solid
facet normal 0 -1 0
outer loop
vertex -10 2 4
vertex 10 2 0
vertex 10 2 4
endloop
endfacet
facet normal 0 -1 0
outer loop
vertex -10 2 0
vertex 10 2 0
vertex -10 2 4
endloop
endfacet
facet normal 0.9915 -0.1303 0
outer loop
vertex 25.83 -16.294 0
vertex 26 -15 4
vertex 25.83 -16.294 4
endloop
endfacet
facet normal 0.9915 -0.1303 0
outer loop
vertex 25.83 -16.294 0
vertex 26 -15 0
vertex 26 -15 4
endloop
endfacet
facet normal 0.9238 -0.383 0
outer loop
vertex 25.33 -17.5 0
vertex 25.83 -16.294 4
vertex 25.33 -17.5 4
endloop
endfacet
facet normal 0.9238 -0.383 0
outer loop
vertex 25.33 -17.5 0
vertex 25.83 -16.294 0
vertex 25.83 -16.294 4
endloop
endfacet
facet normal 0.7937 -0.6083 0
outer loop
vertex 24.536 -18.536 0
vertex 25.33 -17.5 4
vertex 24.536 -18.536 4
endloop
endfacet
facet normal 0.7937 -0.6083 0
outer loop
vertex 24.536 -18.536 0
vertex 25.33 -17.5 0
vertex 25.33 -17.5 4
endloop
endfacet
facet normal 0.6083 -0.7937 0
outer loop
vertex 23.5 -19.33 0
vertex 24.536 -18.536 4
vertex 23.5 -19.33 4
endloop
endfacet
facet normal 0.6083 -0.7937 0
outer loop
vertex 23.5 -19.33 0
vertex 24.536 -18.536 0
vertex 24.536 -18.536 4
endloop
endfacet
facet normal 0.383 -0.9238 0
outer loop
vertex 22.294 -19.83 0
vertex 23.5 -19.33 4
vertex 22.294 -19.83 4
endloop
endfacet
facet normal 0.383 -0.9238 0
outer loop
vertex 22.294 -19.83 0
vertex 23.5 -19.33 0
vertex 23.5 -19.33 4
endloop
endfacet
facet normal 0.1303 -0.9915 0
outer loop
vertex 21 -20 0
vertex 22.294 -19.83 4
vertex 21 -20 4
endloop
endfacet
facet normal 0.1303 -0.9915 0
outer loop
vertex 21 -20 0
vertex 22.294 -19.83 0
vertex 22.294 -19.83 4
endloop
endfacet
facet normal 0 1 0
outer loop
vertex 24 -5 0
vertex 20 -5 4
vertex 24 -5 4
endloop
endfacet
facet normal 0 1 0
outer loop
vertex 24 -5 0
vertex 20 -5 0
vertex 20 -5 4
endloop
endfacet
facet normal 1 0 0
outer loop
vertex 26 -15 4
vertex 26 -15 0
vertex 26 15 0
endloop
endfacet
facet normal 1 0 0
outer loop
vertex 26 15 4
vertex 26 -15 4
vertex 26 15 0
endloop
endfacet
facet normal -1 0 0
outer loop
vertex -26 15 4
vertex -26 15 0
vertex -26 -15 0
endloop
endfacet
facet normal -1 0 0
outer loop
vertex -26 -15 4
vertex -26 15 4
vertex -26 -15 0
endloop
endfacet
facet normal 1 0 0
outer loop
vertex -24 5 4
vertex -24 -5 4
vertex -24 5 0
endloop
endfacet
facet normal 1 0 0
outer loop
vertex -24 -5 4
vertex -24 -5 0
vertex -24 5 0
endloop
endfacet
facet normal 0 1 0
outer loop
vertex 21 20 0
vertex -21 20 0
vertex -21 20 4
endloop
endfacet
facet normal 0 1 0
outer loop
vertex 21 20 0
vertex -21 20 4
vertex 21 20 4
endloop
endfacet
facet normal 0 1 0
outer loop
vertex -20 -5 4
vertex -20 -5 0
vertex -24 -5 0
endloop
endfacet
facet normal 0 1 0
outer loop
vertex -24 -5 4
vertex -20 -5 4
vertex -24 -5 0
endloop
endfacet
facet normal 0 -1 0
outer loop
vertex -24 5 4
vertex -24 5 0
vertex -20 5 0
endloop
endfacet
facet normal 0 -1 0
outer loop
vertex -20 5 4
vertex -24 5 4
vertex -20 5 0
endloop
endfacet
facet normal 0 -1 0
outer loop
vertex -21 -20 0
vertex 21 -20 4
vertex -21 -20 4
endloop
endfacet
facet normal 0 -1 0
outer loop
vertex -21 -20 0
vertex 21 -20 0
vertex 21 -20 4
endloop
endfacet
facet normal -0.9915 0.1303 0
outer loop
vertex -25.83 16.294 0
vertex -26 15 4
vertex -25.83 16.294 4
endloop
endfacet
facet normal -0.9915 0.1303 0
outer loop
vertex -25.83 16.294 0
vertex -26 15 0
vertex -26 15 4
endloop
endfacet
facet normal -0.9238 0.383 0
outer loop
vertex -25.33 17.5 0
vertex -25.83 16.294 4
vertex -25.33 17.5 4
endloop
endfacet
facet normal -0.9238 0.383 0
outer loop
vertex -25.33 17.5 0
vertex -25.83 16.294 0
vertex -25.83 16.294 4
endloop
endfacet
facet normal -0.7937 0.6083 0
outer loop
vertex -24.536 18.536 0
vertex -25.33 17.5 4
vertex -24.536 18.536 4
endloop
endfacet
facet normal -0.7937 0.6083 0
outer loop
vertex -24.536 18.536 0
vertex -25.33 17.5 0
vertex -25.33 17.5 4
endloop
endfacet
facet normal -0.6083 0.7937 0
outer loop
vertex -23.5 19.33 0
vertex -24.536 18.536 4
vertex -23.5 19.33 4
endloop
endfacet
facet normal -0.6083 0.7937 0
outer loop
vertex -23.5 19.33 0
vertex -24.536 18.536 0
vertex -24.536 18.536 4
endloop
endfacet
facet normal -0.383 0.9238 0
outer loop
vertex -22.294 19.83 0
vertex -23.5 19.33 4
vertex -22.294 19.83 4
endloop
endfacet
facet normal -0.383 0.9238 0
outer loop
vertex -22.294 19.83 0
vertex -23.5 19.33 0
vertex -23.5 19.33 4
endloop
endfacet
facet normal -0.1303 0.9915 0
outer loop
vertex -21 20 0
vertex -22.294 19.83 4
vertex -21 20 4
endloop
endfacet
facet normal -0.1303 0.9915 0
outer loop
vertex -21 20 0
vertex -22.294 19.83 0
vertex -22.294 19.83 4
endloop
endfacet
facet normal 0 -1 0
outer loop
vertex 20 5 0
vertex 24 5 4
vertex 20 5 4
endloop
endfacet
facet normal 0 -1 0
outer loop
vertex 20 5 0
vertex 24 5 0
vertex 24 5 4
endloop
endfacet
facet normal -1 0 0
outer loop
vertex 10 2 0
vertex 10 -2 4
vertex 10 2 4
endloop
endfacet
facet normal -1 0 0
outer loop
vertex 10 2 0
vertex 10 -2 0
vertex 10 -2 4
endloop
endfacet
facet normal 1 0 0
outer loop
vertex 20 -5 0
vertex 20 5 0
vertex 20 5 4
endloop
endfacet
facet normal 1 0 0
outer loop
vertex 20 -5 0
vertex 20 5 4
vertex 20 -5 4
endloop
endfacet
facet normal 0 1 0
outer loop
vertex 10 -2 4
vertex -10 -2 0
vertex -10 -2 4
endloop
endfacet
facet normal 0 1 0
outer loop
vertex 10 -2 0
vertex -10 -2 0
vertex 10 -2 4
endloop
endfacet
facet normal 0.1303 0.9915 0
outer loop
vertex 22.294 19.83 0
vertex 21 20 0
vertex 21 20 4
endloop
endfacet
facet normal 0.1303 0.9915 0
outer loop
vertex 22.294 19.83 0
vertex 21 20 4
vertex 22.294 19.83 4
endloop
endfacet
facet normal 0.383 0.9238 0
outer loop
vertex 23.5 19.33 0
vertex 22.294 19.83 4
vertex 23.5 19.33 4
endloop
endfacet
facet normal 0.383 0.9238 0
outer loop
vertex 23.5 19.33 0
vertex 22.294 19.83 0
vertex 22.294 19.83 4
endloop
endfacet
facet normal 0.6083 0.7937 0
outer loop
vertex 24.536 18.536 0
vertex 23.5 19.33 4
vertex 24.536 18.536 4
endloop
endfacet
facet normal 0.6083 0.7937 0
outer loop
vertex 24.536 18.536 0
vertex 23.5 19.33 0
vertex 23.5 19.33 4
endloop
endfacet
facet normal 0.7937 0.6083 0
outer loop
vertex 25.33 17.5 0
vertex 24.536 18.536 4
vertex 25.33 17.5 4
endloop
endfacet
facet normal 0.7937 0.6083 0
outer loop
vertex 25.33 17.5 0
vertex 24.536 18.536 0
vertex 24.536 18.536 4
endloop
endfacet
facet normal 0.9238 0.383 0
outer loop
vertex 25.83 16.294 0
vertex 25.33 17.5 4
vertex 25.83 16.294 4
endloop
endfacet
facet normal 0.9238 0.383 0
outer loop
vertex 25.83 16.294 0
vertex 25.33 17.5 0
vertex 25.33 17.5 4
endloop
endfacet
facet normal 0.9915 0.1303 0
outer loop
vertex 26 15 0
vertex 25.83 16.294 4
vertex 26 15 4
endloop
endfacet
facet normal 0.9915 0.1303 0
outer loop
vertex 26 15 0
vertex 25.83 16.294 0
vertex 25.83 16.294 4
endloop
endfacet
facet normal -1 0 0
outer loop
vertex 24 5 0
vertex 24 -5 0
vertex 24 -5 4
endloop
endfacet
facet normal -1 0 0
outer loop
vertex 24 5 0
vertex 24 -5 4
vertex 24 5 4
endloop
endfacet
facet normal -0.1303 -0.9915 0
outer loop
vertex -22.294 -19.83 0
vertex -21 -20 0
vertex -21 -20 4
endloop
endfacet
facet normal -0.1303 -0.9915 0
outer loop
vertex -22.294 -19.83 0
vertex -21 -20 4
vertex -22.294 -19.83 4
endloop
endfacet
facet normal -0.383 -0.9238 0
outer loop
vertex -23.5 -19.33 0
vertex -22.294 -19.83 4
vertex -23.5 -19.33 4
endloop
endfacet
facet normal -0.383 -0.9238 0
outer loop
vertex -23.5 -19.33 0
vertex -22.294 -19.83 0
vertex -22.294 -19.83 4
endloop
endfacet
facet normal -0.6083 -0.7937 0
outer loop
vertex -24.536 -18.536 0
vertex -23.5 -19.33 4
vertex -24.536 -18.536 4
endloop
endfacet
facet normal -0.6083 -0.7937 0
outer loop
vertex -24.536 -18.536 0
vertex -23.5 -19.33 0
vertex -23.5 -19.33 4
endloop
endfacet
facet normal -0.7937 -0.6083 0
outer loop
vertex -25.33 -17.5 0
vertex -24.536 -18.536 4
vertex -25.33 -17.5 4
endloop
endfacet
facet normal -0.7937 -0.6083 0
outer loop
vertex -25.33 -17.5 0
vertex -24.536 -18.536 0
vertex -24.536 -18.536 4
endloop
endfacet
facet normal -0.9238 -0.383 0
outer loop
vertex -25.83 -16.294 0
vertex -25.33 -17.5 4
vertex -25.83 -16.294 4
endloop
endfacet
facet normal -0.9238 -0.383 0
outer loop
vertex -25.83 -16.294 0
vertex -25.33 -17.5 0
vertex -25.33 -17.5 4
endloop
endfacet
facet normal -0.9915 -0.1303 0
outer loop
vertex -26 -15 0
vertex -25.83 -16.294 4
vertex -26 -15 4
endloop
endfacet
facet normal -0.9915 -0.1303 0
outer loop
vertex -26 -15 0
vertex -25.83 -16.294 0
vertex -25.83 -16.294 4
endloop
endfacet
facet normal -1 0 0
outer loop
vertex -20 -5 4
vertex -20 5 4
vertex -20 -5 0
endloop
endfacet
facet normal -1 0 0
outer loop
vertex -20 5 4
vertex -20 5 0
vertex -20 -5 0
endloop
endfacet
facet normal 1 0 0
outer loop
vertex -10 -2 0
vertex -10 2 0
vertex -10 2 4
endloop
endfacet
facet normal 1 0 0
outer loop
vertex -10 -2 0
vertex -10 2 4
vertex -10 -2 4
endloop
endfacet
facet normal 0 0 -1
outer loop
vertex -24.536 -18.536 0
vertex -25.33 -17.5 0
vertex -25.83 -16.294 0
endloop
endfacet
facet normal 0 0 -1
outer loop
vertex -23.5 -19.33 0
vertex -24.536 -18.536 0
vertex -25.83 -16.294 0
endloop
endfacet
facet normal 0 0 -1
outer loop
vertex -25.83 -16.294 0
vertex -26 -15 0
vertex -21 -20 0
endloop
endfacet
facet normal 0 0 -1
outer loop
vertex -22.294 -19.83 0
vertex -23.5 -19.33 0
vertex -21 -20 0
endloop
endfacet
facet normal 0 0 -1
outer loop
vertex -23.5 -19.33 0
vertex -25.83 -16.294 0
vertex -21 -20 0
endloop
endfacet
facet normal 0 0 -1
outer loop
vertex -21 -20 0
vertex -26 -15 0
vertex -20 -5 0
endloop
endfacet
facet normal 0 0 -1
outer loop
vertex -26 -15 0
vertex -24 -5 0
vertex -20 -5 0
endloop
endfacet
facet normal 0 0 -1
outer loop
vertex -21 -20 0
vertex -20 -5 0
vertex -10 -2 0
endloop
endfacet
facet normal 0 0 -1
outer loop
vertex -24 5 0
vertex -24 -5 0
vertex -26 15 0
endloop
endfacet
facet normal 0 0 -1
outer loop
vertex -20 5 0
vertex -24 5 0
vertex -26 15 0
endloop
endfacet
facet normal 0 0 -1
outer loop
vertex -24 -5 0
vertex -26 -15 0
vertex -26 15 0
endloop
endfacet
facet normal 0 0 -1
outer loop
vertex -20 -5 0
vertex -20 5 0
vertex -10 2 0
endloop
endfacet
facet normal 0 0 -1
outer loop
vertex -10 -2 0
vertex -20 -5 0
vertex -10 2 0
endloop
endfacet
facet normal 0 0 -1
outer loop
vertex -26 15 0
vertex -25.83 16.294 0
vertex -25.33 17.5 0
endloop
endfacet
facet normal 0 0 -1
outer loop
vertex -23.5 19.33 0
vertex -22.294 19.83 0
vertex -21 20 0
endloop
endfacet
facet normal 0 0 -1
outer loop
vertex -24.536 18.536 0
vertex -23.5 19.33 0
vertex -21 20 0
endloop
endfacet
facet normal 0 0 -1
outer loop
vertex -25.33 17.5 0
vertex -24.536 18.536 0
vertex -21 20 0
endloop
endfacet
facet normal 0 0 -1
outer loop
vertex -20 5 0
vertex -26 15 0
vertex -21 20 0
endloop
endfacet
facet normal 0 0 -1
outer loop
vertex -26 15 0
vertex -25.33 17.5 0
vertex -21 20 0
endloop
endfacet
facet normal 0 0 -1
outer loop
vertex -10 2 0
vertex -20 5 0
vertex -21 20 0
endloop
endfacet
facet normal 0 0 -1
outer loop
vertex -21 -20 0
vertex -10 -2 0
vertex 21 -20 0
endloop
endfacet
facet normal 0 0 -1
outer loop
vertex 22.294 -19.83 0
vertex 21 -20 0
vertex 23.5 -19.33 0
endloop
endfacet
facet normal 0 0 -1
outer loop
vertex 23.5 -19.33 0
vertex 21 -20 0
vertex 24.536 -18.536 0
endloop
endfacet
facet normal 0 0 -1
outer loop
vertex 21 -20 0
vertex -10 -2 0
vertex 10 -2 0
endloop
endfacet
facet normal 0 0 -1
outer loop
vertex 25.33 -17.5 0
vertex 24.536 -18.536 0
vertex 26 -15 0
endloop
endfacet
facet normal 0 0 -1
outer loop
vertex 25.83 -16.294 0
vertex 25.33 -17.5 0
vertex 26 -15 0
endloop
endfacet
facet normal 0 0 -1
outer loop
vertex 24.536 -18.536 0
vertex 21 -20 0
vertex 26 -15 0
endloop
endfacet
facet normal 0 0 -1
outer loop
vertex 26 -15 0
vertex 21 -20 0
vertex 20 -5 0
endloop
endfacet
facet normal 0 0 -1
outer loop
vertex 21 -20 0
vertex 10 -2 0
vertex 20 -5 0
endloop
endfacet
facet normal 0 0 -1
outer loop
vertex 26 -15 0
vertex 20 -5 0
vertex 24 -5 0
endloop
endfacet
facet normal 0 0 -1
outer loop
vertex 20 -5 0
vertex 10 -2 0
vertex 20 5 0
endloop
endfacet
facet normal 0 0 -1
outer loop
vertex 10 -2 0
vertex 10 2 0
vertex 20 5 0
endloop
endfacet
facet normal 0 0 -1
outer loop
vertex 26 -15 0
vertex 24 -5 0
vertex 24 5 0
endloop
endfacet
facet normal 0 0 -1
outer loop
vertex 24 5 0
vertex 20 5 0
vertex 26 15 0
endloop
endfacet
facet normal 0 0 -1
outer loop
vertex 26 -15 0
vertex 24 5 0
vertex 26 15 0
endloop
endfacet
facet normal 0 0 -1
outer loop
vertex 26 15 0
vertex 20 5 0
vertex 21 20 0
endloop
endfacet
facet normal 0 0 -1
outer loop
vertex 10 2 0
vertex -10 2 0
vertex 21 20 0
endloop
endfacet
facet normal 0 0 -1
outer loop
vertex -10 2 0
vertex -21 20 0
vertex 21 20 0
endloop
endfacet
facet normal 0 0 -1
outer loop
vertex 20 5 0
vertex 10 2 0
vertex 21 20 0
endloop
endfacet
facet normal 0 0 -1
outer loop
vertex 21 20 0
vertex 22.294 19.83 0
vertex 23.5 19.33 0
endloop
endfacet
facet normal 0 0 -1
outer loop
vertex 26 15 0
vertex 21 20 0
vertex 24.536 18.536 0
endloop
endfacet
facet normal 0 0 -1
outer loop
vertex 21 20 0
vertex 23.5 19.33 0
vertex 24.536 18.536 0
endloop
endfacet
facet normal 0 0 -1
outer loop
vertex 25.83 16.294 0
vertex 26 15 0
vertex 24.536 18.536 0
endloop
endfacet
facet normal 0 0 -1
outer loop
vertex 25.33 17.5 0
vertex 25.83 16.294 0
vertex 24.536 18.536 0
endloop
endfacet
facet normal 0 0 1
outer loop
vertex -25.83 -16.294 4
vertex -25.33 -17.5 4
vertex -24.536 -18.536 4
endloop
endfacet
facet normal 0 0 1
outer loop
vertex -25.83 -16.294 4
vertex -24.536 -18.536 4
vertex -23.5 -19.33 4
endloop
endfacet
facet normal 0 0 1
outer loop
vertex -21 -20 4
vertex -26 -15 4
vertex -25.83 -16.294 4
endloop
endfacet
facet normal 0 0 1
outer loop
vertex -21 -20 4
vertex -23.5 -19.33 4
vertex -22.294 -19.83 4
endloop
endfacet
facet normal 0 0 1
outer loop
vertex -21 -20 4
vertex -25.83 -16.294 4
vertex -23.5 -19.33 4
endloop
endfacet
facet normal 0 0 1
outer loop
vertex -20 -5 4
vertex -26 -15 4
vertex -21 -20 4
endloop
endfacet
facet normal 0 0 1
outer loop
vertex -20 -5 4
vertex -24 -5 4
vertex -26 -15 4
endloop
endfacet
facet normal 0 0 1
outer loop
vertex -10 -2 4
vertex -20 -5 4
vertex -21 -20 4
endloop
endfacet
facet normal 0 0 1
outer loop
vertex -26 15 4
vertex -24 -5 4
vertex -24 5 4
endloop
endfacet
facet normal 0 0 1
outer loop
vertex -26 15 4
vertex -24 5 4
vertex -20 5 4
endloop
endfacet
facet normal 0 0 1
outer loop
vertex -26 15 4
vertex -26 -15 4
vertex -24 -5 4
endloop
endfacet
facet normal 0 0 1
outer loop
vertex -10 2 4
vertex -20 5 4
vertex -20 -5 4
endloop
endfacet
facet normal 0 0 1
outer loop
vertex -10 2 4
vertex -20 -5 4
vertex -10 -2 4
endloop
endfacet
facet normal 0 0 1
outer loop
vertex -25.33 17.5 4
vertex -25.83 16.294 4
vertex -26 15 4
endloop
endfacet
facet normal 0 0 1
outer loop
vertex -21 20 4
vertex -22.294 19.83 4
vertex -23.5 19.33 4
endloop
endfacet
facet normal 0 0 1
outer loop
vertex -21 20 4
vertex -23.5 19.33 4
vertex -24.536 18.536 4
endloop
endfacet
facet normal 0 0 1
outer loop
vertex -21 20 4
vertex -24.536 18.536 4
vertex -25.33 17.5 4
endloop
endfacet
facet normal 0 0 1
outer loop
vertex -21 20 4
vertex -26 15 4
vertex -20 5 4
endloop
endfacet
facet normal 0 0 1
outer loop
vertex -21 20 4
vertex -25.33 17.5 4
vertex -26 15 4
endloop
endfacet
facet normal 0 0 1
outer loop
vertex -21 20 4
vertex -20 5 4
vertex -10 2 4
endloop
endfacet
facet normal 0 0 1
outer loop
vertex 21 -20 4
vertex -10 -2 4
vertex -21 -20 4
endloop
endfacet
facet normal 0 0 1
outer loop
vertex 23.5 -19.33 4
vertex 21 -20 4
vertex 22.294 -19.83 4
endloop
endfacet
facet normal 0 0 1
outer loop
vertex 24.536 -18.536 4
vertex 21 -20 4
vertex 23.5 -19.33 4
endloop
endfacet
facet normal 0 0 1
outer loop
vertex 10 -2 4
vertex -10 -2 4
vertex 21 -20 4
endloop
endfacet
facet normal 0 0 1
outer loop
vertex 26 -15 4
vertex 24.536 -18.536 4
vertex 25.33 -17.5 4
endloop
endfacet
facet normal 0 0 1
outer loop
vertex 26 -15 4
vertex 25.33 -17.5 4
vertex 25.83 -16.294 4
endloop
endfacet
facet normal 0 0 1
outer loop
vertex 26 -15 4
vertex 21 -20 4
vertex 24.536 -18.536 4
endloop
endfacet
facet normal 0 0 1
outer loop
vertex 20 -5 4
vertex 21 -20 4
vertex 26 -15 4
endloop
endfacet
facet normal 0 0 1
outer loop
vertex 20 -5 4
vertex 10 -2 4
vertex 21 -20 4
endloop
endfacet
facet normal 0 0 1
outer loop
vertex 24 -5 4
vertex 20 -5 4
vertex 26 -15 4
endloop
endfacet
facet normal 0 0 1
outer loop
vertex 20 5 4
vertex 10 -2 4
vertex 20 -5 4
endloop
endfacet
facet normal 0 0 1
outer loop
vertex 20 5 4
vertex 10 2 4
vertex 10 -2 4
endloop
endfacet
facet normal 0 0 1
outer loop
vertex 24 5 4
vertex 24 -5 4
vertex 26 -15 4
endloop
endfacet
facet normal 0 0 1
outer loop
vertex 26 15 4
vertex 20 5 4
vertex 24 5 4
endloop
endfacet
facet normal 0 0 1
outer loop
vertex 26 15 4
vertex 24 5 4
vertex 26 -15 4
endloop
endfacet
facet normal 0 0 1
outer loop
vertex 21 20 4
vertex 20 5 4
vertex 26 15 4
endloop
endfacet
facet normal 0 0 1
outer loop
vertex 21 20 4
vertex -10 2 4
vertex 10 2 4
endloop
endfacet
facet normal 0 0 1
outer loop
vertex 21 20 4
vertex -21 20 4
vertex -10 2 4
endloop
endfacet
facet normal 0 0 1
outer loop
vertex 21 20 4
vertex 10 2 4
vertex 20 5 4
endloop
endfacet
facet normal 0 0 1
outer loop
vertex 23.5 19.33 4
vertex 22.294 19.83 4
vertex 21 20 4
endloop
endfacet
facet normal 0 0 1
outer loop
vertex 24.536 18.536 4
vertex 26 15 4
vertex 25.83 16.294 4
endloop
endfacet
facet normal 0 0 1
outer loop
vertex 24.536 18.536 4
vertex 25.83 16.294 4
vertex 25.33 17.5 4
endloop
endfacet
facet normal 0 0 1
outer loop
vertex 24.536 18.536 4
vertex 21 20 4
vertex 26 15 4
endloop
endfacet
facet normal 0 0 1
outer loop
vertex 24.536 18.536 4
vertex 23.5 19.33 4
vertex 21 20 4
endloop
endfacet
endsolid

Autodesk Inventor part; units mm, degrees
ref_plane "YZ Plane" through (0, 0, 0) normal (1, 0, 0) x (0, 1, 0)
ref_plane "XZ Plane" through (0, 0, 0) normal (0, 1, 0) x (-1, 0, 0)
ref_plane "XY Plane" through (0, 0, 0) normal (0, 0, 1) x (1, 0, 0)
sketch "Эскиз1" plane through (0, 0, 0) normal (0, 0, 1) x (1, 0, 0)
  line L0 (-25, 0) -> (25, 0) construction
  line L1 (-10, -2) -> (10, -2)
  line L2 (10, -2) -> (10, 2)
  line L3 (10, 2) -> (-10, 2)
  line L4 (-10, 2) -> (-10, -2)
  line L5 (-24, 5) -> (-20, 5)
  line L6 (-20, 5) -> (-20, -5)
  line L7 (-20, -5) -> (-24, -5)
  line L8 (-24, -5) -> (-24, 5)
  line L9 (0, 20) -> (0, -20) construction
  line L10 (24, 5) -> (20, 5)
  line L11 (20, 5) -> (20, -5)
  line L12 (20, -5) -> (24, -5)
  line L13 (24, -5) -> (24, 5)
  line L14 (-21, 20) -> (21, 20)
  line L15 (21, 20) -> (21, -20) construction
  line L16 (21, -20) -> (-21, -20)
  line L17 (-21, -20) -> (-21, 20) construction
  arc A0 (-21, 20) -> (-26, 15) centre (-21, 15) ccw
  arc A1 (-26, -15) -> (-21, -20) centre (-21, -15) ccw
  arc A2 (21, -20) -> (26, -15) centre (21, -15) ccw
  arc A3 (26, 15) -> (21, 20) centre (21, 15) ccw
  line L18 (-26, 15) -> (-26, -15)
  line L19 (26, -15) -> (26, 15)
  point P0 (0, 0)
  point P1 (-20, 0)
  point P2 (-10, 0)
  point P3 (0, -2)
  point P4 (0, 0)
  dimension "d0" = 4
  dimension "d1" = 40
  dimension "d2" = 20
  dimension "d3" = 10
  dimension "d4" = 50
  dimension "d6" = 52
  dimension "d7" = 40
  dimension "d8" = 5
extrude "Выдавливание1" add sketch "Эскиз1" along normal blind 4
properties part number "PistonPart5" material "Дерево (вишня)"
